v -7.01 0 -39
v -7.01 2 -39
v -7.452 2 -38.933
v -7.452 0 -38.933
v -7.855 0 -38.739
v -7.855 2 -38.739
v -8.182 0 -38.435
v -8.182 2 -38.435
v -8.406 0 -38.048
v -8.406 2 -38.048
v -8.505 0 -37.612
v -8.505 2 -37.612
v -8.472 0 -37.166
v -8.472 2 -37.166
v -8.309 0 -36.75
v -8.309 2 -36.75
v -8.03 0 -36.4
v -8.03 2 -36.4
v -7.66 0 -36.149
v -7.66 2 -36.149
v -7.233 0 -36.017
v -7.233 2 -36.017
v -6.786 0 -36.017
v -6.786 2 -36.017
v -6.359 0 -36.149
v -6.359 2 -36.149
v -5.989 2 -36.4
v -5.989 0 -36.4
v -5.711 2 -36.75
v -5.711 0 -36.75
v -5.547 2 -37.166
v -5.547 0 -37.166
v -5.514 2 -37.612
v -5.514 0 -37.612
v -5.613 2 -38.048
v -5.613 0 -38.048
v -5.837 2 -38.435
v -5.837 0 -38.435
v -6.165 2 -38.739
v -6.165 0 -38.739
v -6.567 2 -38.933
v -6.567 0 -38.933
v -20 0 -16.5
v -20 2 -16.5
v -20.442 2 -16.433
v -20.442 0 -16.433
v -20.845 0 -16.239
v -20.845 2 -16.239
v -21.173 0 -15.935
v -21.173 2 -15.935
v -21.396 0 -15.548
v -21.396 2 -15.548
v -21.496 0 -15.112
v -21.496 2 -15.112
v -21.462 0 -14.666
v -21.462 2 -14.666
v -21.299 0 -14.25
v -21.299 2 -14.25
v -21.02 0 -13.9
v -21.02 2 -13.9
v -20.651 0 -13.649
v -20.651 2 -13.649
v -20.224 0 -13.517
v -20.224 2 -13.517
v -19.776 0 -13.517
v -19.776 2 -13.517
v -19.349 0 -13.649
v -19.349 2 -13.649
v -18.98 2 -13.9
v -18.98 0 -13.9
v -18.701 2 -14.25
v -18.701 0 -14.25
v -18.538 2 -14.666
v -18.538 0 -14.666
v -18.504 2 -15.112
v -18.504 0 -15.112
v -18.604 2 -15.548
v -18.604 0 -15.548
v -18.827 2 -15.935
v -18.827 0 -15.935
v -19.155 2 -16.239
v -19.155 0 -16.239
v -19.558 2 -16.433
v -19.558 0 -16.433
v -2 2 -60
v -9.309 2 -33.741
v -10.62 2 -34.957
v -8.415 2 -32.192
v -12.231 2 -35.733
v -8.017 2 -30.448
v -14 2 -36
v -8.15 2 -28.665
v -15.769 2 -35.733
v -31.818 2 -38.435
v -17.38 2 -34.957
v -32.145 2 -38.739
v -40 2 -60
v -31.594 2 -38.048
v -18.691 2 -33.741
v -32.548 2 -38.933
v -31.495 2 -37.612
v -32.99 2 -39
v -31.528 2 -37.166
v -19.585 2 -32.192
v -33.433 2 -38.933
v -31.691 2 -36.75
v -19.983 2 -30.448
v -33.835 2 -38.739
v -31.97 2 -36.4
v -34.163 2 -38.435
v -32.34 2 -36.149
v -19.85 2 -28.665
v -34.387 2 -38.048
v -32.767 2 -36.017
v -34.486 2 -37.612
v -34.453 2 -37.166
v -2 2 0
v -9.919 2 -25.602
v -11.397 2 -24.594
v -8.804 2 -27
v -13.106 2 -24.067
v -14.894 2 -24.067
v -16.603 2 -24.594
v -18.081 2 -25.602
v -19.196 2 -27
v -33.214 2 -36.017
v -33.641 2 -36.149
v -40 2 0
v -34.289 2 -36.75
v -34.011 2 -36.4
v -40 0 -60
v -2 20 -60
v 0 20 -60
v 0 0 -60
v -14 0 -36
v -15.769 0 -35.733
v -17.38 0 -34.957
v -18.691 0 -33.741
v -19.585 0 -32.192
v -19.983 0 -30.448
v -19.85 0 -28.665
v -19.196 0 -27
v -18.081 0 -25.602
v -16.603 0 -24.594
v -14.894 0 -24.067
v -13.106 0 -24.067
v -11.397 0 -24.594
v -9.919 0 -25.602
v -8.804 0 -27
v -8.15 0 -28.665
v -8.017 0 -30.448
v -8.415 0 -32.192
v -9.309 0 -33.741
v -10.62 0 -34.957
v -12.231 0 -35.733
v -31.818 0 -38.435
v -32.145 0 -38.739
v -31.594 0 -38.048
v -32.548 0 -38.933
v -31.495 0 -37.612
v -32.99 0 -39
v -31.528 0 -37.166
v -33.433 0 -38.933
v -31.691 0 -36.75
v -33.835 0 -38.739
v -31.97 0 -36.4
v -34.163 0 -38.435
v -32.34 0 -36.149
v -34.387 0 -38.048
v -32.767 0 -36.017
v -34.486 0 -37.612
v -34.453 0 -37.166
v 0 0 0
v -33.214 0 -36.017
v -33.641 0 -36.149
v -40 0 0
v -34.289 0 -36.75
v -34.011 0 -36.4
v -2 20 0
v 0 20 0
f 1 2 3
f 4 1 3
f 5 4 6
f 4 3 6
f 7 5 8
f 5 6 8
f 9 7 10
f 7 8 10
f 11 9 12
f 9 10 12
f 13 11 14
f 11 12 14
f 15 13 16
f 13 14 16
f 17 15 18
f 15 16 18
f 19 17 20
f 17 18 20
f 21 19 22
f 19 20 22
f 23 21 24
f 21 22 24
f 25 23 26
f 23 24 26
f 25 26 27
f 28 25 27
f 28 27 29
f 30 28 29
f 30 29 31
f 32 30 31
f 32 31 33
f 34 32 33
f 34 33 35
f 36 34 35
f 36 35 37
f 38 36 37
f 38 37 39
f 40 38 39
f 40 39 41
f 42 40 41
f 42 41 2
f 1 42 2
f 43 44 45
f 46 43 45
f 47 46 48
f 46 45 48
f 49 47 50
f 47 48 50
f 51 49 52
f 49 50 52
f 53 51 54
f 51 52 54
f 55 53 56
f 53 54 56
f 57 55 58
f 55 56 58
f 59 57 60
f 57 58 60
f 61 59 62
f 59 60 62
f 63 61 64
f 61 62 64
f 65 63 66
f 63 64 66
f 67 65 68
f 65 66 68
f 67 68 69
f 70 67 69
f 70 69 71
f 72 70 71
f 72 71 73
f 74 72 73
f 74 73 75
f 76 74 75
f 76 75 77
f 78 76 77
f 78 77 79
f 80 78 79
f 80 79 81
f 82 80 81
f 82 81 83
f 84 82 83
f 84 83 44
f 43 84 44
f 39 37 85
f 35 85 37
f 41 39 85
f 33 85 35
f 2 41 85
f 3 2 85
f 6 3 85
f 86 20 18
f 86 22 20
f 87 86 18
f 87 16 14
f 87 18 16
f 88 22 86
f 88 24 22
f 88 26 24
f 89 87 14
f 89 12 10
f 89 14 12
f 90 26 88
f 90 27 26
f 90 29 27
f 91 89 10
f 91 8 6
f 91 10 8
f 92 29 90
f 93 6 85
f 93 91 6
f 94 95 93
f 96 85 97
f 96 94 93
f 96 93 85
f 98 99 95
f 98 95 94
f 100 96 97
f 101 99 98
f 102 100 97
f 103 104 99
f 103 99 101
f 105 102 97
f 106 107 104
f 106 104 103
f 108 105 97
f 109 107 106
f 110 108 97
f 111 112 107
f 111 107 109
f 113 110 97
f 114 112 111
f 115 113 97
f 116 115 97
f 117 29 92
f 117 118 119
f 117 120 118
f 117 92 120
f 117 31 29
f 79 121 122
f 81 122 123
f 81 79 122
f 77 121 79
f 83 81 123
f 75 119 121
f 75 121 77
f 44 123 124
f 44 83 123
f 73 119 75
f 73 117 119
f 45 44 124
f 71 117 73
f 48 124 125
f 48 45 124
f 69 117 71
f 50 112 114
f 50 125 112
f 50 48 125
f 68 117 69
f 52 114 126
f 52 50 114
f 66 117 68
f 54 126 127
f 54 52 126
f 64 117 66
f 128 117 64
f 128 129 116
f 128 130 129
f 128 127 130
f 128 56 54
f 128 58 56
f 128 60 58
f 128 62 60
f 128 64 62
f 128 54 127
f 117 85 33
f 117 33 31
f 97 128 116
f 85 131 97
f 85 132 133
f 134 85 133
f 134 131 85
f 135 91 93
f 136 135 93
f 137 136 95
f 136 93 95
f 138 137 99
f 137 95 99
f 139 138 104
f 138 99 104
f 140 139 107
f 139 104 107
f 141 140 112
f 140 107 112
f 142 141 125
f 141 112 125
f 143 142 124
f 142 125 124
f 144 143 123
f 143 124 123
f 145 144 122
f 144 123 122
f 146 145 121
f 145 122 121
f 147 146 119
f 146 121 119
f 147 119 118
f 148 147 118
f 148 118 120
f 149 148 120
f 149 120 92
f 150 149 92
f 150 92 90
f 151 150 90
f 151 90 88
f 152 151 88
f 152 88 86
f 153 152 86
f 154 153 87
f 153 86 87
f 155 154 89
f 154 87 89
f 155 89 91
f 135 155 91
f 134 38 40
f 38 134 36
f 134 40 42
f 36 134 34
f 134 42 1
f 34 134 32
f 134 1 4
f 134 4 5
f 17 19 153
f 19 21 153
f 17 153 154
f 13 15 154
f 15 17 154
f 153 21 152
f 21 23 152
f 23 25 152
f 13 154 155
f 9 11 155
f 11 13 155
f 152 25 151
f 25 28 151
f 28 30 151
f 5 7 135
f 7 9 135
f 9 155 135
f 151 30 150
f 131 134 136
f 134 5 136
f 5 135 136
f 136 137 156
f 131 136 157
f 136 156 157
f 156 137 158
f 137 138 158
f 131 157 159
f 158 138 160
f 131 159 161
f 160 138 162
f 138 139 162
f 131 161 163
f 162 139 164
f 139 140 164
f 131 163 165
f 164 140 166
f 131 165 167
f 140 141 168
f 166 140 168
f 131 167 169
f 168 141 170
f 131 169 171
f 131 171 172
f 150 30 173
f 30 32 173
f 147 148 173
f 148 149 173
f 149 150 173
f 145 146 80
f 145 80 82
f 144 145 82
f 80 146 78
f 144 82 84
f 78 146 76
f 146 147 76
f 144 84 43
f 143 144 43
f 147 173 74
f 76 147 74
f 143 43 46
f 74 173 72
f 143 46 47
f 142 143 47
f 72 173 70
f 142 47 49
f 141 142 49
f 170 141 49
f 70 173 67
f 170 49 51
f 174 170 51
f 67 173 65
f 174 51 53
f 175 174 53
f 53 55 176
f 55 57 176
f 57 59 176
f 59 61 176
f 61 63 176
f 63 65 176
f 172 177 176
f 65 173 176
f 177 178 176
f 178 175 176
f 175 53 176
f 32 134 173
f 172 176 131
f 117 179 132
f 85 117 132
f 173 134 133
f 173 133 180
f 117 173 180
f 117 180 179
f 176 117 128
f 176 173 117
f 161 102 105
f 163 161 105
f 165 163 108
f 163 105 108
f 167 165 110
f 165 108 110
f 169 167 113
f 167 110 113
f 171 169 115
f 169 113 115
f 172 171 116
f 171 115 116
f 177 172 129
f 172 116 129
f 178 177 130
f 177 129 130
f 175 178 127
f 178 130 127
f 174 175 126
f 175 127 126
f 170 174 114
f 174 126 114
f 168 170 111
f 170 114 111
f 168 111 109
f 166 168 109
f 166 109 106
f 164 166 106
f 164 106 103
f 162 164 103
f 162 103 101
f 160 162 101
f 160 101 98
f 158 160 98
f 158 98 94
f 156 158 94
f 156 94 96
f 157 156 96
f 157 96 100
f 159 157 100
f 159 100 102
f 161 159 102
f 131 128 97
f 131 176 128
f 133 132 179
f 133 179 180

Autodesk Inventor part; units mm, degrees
ref_plane "YZ Plane" through (0, 0, 0) normal (1, 0, 0) x (0, 1, 0)
ref_plane "XZ Plane" through (0, 0, 0) normal (0, 1, 0) x (-1, 0, 0)
ref_plane "XY Plane" through (0, 0, 0) normal (0, 0, 1) x (1, 0, 0)
sketch "スケッチ1" plane through (0, 0, 0) normal (0, 1, 0) x (-1, 0, 0)
  line L0 (0, 0) -> (40, 0)
  line L1 (40, 0) -> (40, -60)
  line L2 (40, -60) -> (0, -60)
  line L3 (0, -60) -> (0, 0)
  dimension "d0" = 40
  dimension "d1" = 60
extrude "押し出し1" add sketch "スケッチ1" along normal blind 2
sketch "スケッチ2" plane through (0, 0, 0) normal (1, 0, 0) x (0, 0, -1)
  line L0 (0, 2) -> (60, 2)
  line L1 (60, 2) -> (60, 30)
  line L2 (60, 30) -> (0, 30)
  line L3 (0, 30) -> (0, 2)
  point P0 (0, 0)
  dimension "d4" = 60
  dimension "d5" = 28
extrude "押し出し2" add sketch "スケッチ2" against normal blind 2
sketch "スケッチ5" plane through (0, 0, 0) normal (1, 0, 0) x (0, 0, -1)
  point P0 (0, 0)
sketch "スケッチ9" plane through (0, 0, 0) normal (0, -1, 0) x (1, 0, 0)
  point P0 (0, 0)
sketch "スケッチ11" plane through (0, 30, 0) normal (0, 1, 0) x (1, 0, 0)
  line L0 (0, 0) -> (-2, 0)
  line L1 (-2, 0) -> (-2, 60)
  line L2 (-2, 60) -> (0, 60)
  line L3 (0, 60) -> (0, 0)
extrude "押し出し6" cut sketch "スケッチ11" against normal blind 10
sketch "スケッチ12" plane through (0, 0, 0) normal (0, -1, 0) x (1, 0, 0)
  line L0 (0, -60) -> (0, 0) projected
  line L1 (0, -30) -> (-14, -30)
  dimension "d67" = 14
hole "穴4" at (-14, 0, -30) direction (0, 1, 0) diameter 12 end through all
sketch "スケッチ13" plane through (0, 0, 0) normal (0, -1, 0) x (1, 0, 0)
  line L0 (0, -60) -> (0, 0) projected
  line L1 (0, -30) -> (-20, -30)
  circle A0 centre (-20, -30) radius 15
  line L2 (-20, -30) -> (-20, -15)
  line L3 (-20, -30) -> (5.9808, -45)
  line L4 (-20, -30) -> (-149.9038, -105)
  point P0 (-7.0096, -37.5)
  point P1 (-32.9904, -37.5)
  dimension "d76" = 30
  dimension "d75" = 20
  dimension "d77" = 15
  dimension "d78" = 30
  dimension "d79" = 150
  dimension "d80" = 120
  dimension "d81" = 120
hole "穴5" at (-7.0096, 0, -37.5) at (-32.9904, 0, -37.5) at (-20, 0, -15) direction (0, 1, 0) diameter 3 end through all
properties part number "モーター固定"
